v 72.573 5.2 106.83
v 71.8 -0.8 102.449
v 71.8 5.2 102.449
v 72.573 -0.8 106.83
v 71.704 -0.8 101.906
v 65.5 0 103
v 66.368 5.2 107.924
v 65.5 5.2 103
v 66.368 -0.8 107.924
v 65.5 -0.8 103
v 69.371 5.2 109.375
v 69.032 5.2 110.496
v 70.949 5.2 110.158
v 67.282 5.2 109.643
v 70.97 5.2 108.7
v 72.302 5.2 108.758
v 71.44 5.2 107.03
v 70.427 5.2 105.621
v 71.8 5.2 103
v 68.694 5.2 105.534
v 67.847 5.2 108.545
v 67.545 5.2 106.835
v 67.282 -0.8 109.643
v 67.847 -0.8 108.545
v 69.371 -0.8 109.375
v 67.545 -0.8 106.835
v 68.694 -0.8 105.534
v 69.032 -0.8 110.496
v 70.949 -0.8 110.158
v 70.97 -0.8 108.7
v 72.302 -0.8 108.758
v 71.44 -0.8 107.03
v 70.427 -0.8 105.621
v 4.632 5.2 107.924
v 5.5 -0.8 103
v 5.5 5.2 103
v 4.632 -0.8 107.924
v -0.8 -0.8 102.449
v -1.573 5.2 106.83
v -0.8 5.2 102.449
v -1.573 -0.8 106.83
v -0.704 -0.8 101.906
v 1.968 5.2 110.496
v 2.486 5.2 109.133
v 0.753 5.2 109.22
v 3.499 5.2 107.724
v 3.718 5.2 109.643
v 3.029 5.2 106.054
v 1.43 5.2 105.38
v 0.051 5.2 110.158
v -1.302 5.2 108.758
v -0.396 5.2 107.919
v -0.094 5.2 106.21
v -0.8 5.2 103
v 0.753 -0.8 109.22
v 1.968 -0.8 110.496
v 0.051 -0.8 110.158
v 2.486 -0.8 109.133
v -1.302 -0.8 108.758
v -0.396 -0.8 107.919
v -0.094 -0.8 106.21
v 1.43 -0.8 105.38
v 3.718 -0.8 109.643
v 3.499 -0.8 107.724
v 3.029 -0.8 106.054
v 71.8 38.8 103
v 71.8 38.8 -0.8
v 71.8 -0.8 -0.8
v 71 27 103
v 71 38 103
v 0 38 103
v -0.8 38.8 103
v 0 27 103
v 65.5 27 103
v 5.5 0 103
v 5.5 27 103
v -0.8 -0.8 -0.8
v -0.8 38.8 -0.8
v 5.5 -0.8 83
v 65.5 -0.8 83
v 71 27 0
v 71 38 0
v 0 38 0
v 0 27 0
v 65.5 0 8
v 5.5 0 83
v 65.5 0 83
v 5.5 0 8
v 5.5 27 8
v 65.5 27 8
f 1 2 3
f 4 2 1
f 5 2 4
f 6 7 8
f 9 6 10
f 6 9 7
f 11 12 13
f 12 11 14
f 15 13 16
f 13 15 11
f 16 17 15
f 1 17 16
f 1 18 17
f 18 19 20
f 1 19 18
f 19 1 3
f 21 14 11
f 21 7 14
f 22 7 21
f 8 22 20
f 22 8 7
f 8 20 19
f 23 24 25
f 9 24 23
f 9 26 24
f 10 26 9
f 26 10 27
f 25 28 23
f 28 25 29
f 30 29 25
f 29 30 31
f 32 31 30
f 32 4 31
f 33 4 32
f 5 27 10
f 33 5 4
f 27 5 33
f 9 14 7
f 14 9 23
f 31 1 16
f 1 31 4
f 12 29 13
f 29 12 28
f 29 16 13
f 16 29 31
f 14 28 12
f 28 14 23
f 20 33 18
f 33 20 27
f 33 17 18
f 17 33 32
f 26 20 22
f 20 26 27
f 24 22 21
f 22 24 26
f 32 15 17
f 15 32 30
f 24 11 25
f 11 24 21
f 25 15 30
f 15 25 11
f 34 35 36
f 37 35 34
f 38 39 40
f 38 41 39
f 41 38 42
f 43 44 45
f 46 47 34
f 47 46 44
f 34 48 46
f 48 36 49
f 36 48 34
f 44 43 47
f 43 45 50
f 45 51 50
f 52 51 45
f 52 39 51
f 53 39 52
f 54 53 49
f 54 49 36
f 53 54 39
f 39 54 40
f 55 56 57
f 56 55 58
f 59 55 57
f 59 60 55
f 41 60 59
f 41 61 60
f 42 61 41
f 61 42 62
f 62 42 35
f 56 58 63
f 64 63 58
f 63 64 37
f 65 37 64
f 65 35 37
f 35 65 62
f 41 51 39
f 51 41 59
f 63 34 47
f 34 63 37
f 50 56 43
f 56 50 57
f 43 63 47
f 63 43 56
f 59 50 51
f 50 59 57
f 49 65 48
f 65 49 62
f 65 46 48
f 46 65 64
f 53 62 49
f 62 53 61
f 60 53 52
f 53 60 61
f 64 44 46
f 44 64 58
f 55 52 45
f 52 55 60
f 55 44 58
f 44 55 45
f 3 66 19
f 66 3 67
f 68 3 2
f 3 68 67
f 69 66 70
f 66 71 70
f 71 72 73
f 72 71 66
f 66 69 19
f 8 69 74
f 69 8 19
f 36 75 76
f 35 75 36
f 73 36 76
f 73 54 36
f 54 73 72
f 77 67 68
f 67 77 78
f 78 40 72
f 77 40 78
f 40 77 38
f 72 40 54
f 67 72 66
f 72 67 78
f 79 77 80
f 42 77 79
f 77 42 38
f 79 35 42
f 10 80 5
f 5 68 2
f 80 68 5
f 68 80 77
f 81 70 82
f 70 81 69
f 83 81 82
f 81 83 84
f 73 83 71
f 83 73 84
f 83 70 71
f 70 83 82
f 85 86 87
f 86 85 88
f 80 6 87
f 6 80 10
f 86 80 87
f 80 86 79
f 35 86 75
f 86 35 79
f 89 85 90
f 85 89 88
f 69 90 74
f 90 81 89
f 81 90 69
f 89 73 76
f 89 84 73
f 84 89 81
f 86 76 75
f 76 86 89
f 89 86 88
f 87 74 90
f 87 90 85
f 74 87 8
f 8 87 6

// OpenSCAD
width = 71;
depth = 38;
height = 103;
shell = 0.8;
foot_depth = 11;
side_padding = 11/2;

cube([width,depth-foot_depth,8]);
cube([side_padding,depth-foot_depth,height]);
translate([width-side_padding,0,0])
cube([side_padding,depth-foot_depth,height]);


translate([width-side_padding,-shell,height])
rotate([0,10,0])
difference(){
    union(){
        cube([side_padding+shell,6,5]);
        translate([(side_padding+shell)/2,0,5])
        rotate([-90,0,0])
        cylinder(6,d=side_padding+shell);
    }
    translate([(side_padding+shell)/2,0,5])
    rotate([-90,0,0])
    cylinder(6,d=4);
}

translate([side_padding,-shell,height])
rotate([0,-10,0])
translate([-side_padding-shell,0,0])
difference(){
    union(){
        cube([side_padding+shell,6,5]);
        translate([(side_padding+shell)/2,0,5])
        rotate([-90,0,0])
        cylinder(6,d=side_padding+shell);
    }
    translate([(side_padding+shell)/2,0,5])
    rotate([-90,0,0])
    cylinder(6,d=4);
}

difference(){
    translate([-shell,-shell,-shell]) cube([width+shell*2,depth+shell*2,height+shell]);
    cube([width,depth,height+1]);
    translate([side_padding,-shell,height-20])
    #cube([width-side_padding*2,shell,20]);
}
